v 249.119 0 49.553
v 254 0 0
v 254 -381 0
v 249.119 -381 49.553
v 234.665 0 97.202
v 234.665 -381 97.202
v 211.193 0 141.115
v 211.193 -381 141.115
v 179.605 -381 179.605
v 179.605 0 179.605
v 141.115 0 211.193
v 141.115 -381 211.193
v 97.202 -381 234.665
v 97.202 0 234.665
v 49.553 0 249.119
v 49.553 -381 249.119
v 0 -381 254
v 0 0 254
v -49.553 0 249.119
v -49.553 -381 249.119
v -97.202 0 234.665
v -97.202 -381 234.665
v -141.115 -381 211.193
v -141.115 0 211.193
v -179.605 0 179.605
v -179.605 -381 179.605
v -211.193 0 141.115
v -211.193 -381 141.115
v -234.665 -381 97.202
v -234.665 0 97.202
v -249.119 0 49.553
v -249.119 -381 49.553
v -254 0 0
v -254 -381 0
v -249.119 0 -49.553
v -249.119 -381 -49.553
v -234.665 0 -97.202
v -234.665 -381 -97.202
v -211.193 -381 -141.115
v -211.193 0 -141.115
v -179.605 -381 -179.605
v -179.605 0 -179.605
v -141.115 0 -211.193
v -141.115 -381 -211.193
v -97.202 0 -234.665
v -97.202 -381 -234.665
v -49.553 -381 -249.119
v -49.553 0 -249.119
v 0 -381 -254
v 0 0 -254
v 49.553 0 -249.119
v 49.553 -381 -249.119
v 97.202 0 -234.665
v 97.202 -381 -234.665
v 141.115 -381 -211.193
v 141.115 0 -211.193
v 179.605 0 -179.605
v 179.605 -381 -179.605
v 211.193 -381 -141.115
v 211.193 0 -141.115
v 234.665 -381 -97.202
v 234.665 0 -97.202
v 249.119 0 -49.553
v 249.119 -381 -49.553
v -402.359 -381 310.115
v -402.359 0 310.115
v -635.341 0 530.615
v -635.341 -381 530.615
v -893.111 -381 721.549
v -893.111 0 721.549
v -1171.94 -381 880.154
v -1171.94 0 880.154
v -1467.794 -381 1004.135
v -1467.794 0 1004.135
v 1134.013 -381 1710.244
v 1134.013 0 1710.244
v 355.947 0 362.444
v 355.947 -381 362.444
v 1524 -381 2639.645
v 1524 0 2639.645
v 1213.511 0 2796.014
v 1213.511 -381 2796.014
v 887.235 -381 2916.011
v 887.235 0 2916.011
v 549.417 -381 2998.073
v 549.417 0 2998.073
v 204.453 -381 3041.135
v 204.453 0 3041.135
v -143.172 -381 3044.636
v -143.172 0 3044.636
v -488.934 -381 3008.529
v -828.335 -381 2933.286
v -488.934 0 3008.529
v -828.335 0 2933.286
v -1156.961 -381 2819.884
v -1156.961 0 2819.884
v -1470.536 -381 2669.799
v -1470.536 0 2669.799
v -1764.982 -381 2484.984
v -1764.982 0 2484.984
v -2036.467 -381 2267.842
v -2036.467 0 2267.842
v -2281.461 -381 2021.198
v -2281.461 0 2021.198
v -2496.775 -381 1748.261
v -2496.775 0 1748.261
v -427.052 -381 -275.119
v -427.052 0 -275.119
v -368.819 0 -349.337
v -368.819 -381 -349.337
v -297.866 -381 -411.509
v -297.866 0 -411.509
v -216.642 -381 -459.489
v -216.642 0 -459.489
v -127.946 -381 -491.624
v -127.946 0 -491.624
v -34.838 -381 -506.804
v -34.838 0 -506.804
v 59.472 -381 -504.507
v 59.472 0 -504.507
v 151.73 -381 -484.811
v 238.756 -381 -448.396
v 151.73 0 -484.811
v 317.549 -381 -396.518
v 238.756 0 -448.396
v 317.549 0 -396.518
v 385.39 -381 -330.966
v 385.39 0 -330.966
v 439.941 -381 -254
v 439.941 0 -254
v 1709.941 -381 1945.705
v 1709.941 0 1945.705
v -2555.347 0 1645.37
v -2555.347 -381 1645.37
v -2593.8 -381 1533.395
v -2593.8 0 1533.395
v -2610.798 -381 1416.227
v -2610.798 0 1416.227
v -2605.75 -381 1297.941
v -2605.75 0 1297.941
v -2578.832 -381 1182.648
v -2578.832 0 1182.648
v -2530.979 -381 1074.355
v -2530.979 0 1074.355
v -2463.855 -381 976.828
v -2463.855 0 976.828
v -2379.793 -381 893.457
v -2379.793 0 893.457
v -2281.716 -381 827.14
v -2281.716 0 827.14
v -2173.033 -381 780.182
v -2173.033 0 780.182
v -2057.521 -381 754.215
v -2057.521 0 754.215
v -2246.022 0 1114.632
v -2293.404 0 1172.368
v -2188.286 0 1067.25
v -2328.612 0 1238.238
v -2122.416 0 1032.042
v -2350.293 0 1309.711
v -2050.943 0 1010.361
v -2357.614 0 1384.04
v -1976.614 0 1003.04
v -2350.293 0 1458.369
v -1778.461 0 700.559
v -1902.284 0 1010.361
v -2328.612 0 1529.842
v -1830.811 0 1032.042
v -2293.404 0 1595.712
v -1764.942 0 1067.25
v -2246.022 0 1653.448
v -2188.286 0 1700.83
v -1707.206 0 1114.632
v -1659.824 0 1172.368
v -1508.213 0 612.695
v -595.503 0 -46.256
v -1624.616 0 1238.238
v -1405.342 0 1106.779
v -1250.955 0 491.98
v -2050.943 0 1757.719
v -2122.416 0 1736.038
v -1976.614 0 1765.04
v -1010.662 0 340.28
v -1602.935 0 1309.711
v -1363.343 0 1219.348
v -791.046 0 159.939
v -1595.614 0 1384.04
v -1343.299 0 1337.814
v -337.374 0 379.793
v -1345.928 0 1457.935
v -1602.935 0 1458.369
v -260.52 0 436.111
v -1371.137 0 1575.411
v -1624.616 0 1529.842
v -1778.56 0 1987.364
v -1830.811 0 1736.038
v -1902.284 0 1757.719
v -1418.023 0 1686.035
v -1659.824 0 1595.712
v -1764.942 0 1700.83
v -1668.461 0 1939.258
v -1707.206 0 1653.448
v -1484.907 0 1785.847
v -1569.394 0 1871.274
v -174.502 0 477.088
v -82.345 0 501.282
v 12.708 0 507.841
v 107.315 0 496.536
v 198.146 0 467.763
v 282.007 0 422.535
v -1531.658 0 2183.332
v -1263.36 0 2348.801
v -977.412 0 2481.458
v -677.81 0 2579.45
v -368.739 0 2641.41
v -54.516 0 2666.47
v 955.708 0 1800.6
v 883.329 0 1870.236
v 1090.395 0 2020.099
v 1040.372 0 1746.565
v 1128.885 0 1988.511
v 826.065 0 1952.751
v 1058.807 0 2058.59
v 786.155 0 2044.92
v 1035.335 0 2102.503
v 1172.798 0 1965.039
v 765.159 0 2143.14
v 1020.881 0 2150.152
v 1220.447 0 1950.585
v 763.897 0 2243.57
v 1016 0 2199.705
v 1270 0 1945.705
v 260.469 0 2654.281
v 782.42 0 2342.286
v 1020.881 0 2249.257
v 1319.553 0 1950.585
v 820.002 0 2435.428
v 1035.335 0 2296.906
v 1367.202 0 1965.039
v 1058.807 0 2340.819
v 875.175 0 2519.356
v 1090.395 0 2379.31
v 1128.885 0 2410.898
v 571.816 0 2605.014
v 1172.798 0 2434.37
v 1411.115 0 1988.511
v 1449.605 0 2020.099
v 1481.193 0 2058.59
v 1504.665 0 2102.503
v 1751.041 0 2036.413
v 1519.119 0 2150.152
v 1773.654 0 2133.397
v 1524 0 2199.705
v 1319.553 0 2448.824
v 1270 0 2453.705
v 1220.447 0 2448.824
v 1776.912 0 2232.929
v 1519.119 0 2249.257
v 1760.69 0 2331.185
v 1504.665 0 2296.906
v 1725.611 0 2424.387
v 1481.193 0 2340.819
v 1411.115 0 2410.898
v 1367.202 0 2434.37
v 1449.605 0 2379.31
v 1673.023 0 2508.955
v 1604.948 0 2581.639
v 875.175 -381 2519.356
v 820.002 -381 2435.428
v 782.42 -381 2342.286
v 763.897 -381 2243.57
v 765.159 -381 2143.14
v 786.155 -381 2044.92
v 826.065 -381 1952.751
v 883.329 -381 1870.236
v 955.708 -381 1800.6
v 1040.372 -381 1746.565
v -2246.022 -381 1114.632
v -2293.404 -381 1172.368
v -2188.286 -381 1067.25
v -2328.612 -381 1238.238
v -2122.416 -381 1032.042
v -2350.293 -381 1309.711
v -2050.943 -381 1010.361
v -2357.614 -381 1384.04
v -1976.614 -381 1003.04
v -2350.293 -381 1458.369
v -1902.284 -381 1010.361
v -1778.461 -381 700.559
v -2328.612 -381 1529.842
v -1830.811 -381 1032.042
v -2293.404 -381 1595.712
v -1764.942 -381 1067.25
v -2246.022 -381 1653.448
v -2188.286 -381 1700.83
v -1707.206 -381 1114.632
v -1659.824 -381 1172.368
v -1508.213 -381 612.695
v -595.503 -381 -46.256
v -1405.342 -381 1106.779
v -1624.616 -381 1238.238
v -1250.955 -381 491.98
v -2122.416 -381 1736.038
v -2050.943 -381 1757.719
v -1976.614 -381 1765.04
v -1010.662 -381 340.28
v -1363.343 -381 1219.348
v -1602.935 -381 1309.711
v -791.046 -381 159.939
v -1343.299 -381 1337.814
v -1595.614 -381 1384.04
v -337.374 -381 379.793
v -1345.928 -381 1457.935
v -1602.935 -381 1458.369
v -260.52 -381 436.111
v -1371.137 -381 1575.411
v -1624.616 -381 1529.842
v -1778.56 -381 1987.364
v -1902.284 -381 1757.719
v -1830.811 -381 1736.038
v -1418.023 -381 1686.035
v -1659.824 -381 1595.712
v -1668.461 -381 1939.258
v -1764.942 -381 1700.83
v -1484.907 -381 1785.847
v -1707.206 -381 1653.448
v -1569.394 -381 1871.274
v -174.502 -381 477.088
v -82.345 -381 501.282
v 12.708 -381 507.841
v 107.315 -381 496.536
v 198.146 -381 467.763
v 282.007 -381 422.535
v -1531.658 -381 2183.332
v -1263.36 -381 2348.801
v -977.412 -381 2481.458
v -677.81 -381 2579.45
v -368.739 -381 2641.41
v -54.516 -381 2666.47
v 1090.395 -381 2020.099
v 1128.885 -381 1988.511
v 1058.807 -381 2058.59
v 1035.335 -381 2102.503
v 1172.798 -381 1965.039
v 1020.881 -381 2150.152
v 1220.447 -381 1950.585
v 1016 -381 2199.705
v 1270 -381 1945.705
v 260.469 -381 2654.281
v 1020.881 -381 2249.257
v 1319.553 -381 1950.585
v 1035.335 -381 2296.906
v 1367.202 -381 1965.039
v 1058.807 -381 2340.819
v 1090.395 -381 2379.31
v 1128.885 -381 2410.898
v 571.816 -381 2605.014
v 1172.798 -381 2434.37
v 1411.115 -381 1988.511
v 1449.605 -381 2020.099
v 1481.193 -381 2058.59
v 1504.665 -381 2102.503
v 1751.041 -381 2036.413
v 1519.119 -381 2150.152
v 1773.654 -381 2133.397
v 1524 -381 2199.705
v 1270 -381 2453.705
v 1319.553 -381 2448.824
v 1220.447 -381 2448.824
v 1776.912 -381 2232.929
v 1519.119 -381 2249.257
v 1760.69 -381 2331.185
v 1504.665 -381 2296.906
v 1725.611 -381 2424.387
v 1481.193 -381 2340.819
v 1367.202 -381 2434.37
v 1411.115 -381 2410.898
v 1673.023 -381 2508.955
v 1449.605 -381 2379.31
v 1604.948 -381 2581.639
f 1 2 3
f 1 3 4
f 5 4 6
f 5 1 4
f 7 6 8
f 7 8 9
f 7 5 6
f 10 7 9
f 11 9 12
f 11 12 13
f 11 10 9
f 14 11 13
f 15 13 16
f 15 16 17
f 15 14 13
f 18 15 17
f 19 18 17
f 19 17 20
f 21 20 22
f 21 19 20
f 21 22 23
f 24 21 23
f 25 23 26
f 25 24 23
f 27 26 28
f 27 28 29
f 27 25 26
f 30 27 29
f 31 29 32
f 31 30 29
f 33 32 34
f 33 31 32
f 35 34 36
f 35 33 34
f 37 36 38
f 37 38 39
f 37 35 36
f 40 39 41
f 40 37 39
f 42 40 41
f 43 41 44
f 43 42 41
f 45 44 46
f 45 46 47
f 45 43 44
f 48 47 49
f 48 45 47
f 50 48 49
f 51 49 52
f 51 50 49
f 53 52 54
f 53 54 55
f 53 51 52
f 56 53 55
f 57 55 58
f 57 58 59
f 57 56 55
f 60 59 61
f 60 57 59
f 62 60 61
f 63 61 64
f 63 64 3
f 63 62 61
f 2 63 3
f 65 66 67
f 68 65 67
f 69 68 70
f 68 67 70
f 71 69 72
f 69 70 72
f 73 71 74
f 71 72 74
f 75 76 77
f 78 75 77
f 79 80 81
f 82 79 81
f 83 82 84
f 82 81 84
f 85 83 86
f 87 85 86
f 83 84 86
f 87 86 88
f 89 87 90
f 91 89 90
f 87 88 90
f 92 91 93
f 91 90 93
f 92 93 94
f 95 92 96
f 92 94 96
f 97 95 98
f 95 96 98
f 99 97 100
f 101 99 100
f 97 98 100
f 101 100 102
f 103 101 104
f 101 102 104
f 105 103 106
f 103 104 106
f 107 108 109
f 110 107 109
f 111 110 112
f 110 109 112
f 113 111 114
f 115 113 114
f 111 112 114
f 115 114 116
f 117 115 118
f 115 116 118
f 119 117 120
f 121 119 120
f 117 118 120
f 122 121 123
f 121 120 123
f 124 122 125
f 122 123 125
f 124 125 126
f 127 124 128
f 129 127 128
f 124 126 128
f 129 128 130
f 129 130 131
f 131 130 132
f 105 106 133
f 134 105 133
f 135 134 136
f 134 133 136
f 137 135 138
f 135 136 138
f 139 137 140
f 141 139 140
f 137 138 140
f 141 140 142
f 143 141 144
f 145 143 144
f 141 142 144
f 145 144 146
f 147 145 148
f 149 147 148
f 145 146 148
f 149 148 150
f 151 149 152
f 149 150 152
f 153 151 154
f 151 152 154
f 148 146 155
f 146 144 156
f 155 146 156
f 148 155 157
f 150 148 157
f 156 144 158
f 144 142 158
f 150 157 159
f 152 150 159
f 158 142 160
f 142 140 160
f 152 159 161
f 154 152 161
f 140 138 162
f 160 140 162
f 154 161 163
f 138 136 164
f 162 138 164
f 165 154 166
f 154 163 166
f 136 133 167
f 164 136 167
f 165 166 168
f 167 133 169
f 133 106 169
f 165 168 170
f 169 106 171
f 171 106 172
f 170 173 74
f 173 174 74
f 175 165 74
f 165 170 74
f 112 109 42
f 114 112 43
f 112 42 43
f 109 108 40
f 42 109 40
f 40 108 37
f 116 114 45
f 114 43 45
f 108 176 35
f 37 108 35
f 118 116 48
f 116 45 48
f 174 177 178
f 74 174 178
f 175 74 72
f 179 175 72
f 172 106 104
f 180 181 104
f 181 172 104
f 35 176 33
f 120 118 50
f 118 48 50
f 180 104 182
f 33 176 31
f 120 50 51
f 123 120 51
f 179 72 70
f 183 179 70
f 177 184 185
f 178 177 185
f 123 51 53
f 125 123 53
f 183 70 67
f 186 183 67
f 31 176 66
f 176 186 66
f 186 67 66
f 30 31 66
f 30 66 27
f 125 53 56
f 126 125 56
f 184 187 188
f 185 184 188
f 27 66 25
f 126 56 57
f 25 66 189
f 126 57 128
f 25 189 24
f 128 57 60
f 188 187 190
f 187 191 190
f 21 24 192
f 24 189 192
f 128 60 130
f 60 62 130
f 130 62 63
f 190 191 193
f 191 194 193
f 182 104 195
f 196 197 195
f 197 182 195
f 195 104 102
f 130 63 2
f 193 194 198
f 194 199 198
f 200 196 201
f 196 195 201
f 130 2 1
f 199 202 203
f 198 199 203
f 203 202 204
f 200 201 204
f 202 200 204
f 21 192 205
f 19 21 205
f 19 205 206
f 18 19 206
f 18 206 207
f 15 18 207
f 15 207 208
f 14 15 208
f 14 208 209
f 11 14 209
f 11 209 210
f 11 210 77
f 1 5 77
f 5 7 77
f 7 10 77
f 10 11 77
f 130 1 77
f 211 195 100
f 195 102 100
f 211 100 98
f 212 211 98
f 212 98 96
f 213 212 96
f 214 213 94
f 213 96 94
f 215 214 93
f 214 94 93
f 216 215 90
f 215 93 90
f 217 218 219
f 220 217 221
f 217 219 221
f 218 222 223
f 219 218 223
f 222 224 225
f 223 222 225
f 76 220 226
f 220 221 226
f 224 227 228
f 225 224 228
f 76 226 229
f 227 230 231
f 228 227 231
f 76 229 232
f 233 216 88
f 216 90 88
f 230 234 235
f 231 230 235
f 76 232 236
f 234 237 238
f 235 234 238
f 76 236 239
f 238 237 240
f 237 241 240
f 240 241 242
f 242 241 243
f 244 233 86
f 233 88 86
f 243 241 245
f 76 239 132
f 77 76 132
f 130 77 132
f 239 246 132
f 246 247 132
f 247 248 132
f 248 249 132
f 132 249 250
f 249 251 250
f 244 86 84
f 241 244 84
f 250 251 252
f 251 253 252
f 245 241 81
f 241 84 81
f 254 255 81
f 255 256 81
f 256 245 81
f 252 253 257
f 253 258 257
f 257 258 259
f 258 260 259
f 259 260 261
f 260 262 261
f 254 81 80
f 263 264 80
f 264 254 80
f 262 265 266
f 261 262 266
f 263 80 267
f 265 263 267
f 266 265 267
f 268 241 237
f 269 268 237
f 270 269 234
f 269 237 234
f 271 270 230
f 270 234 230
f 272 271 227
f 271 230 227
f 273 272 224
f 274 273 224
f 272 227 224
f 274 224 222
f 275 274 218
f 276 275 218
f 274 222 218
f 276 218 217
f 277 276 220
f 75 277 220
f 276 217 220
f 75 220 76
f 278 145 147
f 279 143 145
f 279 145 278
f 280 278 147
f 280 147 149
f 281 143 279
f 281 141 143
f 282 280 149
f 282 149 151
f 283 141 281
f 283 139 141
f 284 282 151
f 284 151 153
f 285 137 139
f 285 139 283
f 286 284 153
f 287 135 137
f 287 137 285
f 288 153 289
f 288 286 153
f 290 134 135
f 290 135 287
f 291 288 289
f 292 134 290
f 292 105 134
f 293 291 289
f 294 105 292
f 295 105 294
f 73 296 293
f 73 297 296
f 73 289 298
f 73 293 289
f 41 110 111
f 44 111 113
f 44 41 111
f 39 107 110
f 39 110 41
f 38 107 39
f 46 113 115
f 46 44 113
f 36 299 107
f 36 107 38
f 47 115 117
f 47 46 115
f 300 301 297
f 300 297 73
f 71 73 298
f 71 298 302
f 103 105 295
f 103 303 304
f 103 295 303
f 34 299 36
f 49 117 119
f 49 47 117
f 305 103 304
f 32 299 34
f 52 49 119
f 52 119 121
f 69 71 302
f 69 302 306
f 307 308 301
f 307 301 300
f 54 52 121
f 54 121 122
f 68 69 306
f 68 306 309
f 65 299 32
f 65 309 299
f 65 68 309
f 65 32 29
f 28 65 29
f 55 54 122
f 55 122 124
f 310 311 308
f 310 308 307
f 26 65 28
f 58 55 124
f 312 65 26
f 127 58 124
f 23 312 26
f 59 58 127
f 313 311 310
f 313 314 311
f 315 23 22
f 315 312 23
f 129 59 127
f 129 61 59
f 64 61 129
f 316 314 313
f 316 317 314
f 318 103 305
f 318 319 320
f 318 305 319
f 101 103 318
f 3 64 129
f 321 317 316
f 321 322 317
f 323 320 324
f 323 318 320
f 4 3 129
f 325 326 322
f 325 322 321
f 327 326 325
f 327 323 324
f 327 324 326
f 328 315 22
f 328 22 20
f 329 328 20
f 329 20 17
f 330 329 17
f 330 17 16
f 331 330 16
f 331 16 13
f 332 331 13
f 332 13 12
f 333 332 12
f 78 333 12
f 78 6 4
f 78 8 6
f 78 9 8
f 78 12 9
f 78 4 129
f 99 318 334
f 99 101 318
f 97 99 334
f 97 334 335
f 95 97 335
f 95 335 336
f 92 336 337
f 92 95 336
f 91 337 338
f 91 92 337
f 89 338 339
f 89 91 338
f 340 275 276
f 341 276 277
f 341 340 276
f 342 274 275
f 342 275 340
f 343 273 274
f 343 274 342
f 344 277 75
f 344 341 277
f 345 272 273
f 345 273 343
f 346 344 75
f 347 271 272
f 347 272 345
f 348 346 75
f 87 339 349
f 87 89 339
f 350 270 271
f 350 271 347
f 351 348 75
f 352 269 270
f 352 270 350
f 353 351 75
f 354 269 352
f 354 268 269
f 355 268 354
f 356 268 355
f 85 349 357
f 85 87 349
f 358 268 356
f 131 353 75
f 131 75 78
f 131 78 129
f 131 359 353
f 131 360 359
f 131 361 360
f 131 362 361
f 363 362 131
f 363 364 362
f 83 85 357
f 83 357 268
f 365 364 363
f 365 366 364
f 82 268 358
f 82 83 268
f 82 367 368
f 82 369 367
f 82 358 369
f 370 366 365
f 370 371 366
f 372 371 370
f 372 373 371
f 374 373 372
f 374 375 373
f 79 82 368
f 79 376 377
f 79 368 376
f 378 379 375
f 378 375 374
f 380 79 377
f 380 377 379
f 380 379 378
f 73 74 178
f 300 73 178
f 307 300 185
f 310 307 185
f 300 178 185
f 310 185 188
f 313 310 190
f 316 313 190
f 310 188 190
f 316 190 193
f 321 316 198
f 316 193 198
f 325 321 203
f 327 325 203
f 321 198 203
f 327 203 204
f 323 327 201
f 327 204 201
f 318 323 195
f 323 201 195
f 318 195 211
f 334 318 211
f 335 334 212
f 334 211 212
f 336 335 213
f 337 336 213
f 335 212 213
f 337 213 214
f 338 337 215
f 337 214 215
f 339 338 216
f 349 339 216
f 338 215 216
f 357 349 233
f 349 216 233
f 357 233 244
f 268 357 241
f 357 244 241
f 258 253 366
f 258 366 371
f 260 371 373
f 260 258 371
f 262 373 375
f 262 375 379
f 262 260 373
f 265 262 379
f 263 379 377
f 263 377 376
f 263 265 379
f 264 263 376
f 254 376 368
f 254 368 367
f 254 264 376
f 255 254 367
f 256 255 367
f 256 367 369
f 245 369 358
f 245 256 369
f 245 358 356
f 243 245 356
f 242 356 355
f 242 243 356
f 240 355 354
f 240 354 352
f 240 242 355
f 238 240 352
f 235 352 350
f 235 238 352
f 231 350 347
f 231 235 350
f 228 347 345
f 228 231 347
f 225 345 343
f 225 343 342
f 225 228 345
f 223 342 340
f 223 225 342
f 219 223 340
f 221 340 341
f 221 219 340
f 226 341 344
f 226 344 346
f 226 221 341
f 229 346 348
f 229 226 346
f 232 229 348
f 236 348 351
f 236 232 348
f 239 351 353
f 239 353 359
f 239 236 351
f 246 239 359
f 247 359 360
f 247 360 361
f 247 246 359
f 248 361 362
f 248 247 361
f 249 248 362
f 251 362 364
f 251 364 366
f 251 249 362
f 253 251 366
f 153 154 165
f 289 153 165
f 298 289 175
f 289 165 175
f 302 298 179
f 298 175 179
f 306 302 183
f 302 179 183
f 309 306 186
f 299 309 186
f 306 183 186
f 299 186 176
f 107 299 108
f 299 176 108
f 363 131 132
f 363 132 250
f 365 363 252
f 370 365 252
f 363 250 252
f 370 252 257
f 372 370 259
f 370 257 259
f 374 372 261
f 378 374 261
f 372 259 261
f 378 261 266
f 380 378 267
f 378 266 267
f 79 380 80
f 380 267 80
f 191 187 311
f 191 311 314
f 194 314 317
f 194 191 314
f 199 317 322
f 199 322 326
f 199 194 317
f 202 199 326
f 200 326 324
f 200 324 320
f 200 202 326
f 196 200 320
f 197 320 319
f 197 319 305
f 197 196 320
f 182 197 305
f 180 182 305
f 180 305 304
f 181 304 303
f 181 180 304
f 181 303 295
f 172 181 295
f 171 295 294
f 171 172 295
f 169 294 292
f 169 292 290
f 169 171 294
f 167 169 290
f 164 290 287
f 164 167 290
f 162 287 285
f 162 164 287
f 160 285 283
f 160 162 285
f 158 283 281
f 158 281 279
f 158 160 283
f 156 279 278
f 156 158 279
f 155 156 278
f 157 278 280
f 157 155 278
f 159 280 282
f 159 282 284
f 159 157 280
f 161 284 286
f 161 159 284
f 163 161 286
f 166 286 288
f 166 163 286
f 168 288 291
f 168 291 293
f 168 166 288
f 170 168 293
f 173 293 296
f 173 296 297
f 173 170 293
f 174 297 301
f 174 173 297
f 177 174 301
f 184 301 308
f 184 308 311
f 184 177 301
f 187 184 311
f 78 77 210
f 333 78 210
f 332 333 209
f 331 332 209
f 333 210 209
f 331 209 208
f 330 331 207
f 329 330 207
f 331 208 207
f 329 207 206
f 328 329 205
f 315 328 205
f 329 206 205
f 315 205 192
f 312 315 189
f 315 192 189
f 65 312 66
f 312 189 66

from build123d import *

# Parameters (mm, degrees)
F0_R     = 254
F0_R_2   = 381
F1_DEPTH = 381


with BuildPart() as f1:
    # F0 (on Front) → F1 (new body)
    with BuildSketch(Plane.XZ):
        with BuildLine():
            ThreePointArc((1709.940905, 1945.704526), (1760.69032, 2331.184601), (1524, 2639.645431))
            ThreePointArc((1524, 2639.645431), (-659.707943, 2975.75023), (-2496.775431, 1748.260978))
            ThreePointArc((-2496.775431, 1748.260978), (-2557.434532, 1127.383803), (-2057.521233, 754.215362))
            ThreePointArc((-2057.521233, 754.215362), (-1128.449023, 419.867707), (-427.052308, -275.11875))
            ThreePointArc((-427.052308, -275.11875), (12.370505, -507.849358), (439.940905, -254))
            Line((439.940905, -254), (1709.940905, 1945.704526))
        make_face()
        Circle(F0_R, mode=Mode.SUBTRACT)
        with Locations((-1976.613883, 1384.039941)):
            Circle(F0_R_2, mode=Mode.SUBTRACT)
        with BuildLine():
            ThreePointArc((-402.359214, 310.114596), (-893.111016, 721.549186), (-1467.794386, 1004.135059))
            ThreePointArc((-1467.794386, 1004.135059), (-1371.137018, 1575.410697), (-1778.559695, 1987.363684))
            ThreePointArc((-1778.559695, 1987.363684), (-524.190367, 2615.000272), (875.174565, 2519.355704))
            ThreePointArc((875.174565, 2519.355704), (786.155182, 2044.920184), (1134.013399, 1710.243961))
            Line((1134.013399, 1710.243961), (355.947353, 362.443764))
            ThreePointArc((355.947353, 362.443764), (-34.972856, 506.794731), (-402.359214, 310.114596))
        make_face(mode=Mode.SUBTRACT)
        with Locations((1270, 2199.704526)):
            Circle(F0_R, mode=Mode.SUBTRACT)
    extrude(amount=F1_DEPTH)


solid = f1.part
